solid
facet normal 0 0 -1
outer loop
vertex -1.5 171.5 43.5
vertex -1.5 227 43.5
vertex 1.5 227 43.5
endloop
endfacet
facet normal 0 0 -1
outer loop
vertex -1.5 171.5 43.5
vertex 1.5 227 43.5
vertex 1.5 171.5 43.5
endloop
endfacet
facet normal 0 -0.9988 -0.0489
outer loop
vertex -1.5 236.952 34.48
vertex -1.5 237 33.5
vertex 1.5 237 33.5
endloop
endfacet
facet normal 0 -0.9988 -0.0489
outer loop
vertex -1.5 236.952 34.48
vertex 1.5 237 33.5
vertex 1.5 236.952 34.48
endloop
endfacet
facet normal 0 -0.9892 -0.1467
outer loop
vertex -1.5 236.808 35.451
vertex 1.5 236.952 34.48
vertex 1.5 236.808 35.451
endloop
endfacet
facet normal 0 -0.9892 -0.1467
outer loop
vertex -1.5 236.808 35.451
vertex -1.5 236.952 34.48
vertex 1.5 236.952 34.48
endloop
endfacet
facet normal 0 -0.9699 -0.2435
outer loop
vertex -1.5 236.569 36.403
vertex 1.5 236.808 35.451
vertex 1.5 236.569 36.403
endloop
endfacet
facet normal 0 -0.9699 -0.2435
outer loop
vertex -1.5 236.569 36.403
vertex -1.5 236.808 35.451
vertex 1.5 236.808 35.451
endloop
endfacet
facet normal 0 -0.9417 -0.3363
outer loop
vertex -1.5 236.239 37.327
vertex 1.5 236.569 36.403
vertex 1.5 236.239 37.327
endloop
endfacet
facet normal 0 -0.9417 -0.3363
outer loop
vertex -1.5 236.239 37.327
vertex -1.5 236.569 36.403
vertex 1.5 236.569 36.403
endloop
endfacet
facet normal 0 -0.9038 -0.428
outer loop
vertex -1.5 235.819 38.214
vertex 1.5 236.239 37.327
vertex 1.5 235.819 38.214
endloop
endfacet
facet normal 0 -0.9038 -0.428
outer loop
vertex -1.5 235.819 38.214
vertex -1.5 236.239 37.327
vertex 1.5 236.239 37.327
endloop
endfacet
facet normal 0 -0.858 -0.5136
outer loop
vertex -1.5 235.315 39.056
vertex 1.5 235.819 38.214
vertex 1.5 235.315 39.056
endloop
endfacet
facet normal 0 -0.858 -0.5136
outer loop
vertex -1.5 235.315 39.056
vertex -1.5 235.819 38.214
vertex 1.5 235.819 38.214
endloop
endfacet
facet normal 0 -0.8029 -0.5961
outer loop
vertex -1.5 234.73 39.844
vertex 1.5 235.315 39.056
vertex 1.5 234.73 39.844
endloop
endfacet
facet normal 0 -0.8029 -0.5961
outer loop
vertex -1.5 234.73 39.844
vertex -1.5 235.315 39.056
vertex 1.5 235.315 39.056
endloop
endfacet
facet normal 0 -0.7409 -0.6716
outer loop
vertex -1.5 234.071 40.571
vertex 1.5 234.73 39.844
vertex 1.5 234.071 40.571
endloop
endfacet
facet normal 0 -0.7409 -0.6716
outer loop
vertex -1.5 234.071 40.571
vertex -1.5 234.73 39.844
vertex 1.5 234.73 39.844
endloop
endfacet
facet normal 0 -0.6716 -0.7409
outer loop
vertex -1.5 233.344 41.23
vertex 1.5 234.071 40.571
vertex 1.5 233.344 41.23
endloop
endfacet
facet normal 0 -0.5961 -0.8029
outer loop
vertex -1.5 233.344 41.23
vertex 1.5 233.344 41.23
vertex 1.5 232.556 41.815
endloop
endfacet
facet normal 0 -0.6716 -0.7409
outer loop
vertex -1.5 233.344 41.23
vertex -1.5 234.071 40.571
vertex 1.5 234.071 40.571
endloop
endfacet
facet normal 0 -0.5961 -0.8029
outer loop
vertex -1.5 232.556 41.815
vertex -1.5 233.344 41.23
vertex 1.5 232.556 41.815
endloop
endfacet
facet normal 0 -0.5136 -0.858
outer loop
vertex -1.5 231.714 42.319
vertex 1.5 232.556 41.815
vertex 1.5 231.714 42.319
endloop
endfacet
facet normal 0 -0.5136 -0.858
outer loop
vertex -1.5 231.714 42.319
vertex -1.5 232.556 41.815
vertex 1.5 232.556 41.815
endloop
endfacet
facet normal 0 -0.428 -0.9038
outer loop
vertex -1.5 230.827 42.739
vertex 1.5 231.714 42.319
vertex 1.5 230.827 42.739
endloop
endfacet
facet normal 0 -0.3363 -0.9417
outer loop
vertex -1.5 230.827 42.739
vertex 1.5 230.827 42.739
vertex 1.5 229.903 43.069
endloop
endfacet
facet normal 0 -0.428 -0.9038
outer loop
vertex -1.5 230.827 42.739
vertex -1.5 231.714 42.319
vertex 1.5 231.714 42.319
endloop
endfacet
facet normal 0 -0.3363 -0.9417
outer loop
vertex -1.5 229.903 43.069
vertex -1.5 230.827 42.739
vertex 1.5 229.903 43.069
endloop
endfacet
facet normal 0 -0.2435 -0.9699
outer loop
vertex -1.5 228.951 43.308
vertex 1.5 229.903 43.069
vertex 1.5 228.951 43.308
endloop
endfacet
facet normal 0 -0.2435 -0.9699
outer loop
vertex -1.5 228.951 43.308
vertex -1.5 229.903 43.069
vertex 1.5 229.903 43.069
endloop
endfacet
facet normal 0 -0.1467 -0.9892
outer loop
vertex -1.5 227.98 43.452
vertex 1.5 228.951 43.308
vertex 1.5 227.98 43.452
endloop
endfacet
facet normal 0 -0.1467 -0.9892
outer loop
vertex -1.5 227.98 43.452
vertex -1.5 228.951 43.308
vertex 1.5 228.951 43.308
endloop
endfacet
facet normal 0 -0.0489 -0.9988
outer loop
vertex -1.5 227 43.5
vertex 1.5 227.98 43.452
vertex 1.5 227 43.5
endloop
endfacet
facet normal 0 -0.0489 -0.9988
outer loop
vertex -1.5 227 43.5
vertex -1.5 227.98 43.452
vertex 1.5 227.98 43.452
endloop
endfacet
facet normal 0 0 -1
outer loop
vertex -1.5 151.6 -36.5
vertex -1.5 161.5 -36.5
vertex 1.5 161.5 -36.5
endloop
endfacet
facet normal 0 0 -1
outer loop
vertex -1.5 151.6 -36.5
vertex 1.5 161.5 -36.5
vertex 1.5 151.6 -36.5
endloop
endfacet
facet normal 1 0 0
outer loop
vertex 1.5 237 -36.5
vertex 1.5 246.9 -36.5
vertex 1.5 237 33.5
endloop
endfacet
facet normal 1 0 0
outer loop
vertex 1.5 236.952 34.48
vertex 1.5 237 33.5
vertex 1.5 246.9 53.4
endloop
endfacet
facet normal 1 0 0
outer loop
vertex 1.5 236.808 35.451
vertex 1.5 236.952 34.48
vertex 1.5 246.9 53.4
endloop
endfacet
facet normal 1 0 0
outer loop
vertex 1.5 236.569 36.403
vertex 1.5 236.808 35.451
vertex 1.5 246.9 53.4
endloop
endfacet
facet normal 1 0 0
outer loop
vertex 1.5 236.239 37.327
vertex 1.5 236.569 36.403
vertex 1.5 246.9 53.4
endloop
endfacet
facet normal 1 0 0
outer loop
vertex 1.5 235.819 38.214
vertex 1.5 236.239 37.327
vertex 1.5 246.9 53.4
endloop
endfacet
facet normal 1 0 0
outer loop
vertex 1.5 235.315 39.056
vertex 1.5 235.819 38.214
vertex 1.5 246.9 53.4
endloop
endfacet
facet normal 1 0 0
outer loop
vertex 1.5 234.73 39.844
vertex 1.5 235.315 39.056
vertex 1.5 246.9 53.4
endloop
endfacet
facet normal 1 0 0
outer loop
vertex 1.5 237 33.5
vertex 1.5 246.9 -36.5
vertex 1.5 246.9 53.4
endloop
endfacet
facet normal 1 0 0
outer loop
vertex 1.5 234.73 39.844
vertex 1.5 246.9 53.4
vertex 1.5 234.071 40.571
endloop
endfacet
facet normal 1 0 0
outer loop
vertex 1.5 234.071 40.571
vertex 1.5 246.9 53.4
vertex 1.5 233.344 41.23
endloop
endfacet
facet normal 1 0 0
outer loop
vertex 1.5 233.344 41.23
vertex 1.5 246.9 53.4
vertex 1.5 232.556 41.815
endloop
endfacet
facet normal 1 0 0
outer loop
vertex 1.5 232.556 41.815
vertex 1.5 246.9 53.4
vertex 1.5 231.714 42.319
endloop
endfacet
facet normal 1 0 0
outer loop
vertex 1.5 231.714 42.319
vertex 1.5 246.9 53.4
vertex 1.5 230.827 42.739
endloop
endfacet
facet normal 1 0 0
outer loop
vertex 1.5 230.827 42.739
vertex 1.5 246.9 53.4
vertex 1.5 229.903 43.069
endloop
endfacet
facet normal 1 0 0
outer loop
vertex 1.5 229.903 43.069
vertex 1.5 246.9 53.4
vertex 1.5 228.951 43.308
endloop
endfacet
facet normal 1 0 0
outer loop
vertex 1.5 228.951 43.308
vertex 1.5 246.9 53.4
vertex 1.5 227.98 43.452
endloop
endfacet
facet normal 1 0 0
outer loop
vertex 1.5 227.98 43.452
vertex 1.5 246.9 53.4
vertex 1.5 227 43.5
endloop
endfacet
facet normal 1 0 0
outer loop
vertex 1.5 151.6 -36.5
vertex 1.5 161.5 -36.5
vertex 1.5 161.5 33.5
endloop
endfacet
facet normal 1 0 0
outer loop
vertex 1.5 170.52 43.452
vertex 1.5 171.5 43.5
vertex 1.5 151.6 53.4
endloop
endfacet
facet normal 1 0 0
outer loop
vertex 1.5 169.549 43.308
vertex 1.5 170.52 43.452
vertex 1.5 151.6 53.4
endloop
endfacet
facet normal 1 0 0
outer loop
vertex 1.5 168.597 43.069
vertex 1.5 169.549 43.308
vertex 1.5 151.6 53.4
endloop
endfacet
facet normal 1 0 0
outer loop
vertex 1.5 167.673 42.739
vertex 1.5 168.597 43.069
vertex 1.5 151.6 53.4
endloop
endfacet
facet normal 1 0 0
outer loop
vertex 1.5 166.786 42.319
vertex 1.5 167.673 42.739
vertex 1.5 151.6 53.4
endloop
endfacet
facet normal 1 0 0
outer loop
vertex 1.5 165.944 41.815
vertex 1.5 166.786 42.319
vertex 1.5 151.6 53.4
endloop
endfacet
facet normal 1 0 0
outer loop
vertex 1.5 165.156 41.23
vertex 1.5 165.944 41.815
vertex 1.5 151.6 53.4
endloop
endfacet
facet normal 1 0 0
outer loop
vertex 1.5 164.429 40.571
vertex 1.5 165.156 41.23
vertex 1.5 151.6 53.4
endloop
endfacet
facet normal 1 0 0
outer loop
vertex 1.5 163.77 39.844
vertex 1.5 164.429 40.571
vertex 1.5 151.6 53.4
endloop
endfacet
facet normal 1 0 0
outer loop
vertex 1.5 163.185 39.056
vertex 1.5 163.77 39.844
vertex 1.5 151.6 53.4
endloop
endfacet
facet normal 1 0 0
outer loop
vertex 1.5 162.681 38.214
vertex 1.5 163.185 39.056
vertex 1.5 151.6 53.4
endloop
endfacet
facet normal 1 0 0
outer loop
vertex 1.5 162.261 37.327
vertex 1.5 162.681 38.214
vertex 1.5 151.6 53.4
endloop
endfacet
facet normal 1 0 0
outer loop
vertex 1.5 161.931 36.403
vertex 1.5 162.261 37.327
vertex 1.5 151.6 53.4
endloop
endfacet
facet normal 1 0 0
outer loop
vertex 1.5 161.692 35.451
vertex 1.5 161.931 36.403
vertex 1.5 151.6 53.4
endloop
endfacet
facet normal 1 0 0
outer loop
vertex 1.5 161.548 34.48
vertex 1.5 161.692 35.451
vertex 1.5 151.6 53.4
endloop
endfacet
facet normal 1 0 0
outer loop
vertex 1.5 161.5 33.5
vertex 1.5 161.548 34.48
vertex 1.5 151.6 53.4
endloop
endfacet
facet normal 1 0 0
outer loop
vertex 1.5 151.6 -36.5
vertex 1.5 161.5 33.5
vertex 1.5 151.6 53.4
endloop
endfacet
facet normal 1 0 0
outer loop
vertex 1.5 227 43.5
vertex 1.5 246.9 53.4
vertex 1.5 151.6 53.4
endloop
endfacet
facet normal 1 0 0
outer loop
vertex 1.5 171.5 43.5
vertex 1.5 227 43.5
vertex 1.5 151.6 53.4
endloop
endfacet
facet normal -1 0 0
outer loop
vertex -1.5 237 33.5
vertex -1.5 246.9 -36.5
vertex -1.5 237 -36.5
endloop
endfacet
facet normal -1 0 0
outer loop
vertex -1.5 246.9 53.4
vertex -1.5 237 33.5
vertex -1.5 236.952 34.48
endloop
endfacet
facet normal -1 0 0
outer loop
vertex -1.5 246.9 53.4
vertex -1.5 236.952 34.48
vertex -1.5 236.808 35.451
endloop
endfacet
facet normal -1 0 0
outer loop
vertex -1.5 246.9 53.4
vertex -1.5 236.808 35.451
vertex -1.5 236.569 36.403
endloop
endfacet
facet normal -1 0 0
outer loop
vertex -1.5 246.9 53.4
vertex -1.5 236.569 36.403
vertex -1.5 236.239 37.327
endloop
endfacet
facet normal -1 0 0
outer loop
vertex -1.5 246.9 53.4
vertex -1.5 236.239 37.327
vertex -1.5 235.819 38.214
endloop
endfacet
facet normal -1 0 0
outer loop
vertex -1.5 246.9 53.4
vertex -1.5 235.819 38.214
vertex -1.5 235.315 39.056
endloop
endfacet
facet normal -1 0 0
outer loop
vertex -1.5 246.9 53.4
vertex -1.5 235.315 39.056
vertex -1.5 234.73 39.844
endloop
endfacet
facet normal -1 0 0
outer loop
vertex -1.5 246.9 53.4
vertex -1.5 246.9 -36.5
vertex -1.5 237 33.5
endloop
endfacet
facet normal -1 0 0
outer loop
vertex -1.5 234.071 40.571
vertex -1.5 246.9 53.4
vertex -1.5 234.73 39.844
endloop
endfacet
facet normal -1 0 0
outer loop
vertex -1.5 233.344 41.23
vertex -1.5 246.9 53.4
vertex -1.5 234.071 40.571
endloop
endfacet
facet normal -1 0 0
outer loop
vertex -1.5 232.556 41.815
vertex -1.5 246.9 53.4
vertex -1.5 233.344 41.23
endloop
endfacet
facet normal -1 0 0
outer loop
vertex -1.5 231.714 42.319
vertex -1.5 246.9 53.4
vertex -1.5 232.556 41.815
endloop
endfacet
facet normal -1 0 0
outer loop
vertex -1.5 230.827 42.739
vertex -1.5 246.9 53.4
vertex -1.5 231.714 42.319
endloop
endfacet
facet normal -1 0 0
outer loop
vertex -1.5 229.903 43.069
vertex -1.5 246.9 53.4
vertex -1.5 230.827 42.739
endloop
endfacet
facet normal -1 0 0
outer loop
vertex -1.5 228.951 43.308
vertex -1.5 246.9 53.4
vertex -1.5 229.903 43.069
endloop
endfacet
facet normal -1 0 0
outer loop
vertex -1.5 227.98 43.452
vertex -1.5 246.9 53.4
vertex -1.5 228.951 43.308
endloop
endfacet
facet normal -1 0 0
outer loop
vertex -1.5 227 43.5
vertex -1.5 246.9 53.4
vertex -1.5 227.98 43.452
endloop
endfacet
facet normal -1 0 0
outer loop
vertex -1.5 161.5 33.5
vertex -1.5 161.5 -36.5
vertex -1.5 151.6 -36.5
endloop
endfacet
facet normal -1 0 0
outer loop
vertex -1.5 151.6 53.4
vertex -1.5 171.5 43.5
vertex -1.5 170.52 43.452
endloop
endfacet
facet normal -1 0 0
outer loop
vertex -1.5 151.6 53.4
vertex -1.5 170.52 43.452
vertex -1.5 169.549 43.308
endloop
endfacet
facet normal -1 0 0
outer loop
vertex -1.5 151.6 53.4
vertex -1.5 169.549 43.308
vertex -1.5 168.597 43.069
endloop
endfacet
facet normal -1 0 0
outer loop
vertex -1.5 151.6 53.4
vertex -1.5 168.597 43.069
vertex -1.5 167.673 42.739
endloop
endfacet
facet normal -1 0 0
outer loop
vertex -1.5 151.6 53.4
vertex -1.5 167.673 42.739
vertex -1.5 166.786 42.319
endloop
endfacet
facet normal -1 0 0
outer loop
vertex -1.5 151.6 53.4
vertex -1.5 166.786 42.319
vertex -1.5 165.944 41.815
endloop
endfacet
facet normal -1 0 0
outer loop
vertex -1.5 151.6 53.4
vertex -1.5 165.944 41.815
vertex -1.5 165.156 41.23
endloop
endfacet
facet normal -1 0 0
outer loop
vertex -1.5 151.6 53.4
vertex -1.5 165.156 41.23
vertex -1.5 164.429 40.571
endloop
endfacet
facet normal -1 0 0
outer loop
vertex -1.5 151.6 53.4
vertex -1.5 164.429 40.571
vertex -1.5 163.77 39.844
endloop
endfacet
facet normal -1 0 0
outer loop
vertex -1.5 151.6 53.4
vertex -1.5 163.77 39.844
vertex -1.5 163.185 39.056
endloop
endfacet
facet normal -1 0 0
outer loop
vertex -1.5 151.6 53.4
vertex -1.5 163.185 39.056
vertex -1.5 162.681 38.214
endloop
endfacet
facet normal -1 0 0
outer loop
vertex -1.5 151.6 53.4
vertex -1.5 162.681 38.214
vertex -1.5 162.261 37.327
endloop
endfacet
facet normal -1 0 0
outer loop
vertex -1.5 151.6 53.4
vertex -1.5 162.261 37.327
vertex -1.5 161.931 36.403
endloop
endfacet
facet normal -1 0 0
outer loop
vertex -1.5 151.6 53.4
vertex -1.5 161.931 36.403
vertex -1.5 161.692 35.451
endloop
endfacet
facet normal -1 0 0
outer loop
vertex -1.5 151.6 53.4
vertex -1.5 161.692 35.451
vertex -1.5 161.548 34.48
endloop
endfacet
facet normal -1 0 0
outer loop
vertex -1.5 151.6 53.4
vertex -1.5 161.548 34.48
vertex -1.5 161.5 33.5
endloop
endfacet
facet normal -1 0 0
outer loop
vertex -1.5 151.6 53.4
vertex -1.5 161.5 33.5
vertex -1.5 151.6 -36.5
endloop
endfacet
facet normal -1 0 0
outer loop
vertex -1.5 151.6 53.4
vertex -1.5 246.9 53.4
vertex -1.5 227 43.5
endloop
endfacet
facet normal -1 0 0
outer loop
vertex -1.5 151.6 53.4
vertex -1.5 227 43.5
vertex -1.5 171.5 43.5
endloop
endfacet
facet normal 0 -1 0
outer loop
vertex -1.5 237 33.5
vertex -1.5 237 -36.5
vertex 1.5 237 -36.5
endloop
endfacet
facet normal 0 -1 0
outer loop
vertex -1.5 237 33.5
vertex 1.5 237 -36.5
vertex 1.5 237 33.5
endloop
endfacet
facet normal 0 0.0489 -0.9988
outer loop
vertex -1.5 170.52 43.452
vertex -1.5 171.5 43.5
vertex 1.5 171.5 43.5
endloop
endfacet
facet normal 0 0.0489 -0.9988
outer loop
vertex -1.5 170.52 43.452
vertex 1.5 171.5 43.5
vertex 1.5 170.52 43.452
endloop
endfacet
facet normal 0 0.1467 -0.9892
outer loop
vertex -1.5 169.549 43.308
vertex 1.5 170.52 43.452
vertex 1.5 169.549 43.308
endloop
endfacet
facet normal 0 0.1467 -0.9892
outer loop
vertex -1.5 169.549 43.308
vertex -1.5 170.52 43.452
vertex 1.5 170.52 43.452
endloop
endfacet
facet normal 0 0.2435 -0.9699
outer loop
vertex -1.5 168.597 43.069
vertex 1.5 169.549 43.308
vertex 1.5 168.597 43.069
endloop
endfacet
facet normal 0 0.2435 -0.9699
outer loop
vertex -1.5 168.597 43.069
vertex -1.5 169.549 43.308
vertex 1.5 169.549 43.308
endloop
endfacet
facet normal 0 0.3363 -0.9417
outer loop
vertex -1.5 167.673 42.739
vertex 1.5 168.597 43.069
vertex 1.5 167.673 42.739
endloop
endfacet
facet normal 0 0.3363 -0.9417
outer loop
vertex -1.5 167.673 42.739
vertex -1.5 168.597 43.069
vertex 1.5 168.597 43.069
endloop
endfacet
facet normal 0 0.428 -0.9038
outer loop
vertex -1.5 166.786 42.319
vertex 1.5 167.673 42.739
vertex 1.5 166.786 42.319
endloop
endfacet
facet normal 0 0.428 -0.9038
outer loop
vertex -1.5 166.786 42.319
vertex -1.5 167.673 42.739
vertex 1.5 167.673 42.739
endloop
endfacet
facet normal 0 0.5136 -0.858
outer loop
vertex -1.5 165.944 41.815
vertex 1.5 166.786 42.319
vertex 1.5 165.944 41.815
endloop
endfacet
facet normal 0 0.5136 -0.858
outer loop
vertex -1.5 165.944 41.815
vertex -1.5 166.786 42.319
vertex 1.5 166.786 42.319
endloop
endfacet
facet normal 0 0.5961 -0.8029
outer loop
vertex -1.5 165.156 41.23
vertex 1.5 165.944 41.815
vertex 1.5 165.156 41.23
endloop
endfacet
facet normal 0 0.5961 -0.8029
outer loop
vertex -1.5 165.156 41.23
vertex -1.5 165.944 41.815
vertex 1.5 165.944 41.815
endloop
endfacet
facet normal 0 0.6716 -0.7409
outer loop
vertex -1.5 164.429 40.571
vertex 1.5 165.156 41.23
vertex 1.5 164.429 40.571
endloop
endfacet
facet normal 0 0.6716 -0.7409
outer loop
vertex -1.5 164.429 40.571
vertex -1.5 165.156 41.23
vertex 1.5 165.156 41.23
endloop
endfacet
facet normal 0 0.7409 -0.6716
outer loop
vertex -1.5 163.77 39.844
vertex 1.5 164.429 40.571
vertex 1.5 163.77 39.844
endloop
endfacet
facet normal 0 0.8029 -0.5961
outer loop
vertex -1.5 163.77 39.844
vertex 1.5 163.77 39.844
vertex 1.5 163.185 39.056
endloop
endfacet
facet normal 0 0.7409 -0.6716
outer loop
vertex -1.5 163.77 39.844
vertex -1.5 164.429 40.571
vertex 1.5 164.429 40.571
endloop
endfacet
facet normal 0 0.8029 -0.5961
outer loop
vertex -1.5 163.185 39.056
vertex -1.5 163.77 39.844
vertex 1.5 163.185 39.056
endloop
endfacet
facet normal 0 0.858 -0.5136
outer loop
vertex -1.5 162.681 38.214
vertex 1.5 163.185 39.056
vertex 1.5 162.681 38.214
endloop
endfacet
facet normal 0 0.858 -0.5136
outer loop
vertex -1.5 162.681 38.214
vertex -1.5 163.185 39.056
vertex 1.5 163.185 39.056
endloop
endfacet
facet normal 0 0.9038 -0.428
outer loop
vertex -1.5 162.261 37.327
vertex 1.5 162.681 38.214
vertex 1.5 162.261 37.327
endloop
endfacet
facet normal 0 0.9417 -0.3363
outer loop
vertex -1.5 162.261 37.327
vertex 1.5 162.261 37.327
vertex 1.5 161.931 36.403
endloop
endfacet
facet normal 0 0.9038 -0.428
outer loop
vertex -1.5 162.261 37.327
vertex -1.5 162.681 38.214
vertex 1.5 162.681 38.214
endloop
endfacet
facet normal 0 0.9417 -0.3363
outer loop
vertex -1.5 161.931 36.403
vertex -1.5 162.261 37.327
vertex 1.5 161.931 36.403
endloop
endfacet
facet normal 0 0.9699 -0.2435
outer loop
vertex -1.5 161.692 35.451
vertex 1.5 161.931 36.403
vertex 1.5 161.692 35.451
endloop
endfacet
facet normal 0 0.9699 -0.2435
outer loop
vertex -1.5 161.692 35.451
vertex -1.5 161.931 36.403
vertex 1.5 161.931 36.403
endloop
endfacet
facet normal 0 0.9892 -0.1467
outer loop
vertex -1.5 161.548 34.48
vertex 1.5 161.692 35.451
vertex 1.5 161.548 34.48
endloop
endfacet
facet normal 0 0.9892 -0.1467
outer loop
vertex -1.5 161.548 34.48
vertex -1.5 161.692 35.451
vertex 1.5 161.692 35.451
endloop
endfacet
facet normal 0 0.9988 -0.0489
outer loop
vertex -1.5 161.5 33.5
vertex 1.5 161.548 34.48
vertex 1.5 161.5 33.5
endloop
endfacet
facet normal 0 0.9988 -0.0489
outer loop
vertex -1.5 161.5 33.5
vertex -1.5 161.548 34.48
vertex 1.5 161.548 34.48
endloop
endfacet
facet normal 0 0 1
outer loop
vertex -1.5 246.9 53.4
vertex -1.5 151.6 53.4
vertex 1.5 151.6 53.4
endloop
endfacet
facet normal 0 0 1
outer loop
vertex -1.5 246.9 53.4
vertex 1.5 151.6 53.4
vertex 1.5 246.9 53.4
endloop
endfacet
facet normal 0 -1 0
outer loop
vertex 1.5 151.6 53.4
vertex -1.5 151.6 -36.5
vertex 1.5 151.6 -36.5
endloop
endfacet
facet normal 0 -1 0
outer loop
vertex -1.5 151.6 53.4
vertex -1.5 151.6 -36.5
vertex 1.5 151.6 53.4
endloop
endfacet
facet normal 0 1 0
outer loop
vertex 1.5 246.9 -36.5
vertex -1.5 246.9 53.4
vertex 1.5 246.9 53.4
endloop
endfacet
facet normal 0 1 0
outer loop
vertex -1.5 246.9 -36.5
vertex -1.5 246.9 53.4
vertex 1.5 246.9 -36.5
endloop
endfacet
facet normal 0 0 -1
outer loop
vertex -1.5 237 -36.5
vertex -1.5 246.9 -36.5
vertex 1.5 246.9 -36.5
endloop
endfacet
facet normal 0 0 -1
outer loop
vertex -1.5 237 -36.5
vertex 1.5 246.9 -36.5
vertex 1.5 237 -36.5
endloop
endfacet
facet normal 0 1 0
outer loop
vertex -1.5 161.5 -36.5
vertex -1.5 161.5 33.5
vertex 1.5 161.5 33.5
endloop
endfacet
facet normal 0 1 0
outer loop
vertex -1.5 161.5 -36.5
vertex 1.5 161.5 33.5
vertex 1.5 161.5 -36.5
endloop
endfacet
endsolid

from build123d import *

# Parameters (mm, degrees)
EXTRUDE_1_DEPTH = 3


with BuildPart() as part:
    # Эскиз1 → Бобышка-Вытянуть1 (new body)
    with BuildSketch(Plane(origin=(-1.5, 0, 0), x_dir=(0, -1, 0), z_dir=(-1, 0, 0))):
        with BuildLine():
            Line((-237, -36.5), (-237, 33.5))
            ThreePointArc((-237, 33.5), (-234.071067812, 40.571067812), (-227, 43.5))
            Line((-227, 43.5), (-171.5, 43.5))
            ThreePointArc((-171.5, 43.5), (-164.428932188, 40.571067812), (-161.5, 33.5))
            Line((-161.5, 33.5), (-161.5, -36.5))
            Line((-161.5, -36.5), (-151.6, -36.5))
            Line((-151.6, -36.5), (-151.6, 53.4))
            Line((-151.6, 53.4), (-246.9, 53.4))
            Line((-246.9, 53.4), (-246.9, -36.5))
            Line((-246.9, -36.5), (-237, -36.5))
        make_face()
    extrude(amount=-EXTRUDE_1_DEPTH)


solid = part.part
